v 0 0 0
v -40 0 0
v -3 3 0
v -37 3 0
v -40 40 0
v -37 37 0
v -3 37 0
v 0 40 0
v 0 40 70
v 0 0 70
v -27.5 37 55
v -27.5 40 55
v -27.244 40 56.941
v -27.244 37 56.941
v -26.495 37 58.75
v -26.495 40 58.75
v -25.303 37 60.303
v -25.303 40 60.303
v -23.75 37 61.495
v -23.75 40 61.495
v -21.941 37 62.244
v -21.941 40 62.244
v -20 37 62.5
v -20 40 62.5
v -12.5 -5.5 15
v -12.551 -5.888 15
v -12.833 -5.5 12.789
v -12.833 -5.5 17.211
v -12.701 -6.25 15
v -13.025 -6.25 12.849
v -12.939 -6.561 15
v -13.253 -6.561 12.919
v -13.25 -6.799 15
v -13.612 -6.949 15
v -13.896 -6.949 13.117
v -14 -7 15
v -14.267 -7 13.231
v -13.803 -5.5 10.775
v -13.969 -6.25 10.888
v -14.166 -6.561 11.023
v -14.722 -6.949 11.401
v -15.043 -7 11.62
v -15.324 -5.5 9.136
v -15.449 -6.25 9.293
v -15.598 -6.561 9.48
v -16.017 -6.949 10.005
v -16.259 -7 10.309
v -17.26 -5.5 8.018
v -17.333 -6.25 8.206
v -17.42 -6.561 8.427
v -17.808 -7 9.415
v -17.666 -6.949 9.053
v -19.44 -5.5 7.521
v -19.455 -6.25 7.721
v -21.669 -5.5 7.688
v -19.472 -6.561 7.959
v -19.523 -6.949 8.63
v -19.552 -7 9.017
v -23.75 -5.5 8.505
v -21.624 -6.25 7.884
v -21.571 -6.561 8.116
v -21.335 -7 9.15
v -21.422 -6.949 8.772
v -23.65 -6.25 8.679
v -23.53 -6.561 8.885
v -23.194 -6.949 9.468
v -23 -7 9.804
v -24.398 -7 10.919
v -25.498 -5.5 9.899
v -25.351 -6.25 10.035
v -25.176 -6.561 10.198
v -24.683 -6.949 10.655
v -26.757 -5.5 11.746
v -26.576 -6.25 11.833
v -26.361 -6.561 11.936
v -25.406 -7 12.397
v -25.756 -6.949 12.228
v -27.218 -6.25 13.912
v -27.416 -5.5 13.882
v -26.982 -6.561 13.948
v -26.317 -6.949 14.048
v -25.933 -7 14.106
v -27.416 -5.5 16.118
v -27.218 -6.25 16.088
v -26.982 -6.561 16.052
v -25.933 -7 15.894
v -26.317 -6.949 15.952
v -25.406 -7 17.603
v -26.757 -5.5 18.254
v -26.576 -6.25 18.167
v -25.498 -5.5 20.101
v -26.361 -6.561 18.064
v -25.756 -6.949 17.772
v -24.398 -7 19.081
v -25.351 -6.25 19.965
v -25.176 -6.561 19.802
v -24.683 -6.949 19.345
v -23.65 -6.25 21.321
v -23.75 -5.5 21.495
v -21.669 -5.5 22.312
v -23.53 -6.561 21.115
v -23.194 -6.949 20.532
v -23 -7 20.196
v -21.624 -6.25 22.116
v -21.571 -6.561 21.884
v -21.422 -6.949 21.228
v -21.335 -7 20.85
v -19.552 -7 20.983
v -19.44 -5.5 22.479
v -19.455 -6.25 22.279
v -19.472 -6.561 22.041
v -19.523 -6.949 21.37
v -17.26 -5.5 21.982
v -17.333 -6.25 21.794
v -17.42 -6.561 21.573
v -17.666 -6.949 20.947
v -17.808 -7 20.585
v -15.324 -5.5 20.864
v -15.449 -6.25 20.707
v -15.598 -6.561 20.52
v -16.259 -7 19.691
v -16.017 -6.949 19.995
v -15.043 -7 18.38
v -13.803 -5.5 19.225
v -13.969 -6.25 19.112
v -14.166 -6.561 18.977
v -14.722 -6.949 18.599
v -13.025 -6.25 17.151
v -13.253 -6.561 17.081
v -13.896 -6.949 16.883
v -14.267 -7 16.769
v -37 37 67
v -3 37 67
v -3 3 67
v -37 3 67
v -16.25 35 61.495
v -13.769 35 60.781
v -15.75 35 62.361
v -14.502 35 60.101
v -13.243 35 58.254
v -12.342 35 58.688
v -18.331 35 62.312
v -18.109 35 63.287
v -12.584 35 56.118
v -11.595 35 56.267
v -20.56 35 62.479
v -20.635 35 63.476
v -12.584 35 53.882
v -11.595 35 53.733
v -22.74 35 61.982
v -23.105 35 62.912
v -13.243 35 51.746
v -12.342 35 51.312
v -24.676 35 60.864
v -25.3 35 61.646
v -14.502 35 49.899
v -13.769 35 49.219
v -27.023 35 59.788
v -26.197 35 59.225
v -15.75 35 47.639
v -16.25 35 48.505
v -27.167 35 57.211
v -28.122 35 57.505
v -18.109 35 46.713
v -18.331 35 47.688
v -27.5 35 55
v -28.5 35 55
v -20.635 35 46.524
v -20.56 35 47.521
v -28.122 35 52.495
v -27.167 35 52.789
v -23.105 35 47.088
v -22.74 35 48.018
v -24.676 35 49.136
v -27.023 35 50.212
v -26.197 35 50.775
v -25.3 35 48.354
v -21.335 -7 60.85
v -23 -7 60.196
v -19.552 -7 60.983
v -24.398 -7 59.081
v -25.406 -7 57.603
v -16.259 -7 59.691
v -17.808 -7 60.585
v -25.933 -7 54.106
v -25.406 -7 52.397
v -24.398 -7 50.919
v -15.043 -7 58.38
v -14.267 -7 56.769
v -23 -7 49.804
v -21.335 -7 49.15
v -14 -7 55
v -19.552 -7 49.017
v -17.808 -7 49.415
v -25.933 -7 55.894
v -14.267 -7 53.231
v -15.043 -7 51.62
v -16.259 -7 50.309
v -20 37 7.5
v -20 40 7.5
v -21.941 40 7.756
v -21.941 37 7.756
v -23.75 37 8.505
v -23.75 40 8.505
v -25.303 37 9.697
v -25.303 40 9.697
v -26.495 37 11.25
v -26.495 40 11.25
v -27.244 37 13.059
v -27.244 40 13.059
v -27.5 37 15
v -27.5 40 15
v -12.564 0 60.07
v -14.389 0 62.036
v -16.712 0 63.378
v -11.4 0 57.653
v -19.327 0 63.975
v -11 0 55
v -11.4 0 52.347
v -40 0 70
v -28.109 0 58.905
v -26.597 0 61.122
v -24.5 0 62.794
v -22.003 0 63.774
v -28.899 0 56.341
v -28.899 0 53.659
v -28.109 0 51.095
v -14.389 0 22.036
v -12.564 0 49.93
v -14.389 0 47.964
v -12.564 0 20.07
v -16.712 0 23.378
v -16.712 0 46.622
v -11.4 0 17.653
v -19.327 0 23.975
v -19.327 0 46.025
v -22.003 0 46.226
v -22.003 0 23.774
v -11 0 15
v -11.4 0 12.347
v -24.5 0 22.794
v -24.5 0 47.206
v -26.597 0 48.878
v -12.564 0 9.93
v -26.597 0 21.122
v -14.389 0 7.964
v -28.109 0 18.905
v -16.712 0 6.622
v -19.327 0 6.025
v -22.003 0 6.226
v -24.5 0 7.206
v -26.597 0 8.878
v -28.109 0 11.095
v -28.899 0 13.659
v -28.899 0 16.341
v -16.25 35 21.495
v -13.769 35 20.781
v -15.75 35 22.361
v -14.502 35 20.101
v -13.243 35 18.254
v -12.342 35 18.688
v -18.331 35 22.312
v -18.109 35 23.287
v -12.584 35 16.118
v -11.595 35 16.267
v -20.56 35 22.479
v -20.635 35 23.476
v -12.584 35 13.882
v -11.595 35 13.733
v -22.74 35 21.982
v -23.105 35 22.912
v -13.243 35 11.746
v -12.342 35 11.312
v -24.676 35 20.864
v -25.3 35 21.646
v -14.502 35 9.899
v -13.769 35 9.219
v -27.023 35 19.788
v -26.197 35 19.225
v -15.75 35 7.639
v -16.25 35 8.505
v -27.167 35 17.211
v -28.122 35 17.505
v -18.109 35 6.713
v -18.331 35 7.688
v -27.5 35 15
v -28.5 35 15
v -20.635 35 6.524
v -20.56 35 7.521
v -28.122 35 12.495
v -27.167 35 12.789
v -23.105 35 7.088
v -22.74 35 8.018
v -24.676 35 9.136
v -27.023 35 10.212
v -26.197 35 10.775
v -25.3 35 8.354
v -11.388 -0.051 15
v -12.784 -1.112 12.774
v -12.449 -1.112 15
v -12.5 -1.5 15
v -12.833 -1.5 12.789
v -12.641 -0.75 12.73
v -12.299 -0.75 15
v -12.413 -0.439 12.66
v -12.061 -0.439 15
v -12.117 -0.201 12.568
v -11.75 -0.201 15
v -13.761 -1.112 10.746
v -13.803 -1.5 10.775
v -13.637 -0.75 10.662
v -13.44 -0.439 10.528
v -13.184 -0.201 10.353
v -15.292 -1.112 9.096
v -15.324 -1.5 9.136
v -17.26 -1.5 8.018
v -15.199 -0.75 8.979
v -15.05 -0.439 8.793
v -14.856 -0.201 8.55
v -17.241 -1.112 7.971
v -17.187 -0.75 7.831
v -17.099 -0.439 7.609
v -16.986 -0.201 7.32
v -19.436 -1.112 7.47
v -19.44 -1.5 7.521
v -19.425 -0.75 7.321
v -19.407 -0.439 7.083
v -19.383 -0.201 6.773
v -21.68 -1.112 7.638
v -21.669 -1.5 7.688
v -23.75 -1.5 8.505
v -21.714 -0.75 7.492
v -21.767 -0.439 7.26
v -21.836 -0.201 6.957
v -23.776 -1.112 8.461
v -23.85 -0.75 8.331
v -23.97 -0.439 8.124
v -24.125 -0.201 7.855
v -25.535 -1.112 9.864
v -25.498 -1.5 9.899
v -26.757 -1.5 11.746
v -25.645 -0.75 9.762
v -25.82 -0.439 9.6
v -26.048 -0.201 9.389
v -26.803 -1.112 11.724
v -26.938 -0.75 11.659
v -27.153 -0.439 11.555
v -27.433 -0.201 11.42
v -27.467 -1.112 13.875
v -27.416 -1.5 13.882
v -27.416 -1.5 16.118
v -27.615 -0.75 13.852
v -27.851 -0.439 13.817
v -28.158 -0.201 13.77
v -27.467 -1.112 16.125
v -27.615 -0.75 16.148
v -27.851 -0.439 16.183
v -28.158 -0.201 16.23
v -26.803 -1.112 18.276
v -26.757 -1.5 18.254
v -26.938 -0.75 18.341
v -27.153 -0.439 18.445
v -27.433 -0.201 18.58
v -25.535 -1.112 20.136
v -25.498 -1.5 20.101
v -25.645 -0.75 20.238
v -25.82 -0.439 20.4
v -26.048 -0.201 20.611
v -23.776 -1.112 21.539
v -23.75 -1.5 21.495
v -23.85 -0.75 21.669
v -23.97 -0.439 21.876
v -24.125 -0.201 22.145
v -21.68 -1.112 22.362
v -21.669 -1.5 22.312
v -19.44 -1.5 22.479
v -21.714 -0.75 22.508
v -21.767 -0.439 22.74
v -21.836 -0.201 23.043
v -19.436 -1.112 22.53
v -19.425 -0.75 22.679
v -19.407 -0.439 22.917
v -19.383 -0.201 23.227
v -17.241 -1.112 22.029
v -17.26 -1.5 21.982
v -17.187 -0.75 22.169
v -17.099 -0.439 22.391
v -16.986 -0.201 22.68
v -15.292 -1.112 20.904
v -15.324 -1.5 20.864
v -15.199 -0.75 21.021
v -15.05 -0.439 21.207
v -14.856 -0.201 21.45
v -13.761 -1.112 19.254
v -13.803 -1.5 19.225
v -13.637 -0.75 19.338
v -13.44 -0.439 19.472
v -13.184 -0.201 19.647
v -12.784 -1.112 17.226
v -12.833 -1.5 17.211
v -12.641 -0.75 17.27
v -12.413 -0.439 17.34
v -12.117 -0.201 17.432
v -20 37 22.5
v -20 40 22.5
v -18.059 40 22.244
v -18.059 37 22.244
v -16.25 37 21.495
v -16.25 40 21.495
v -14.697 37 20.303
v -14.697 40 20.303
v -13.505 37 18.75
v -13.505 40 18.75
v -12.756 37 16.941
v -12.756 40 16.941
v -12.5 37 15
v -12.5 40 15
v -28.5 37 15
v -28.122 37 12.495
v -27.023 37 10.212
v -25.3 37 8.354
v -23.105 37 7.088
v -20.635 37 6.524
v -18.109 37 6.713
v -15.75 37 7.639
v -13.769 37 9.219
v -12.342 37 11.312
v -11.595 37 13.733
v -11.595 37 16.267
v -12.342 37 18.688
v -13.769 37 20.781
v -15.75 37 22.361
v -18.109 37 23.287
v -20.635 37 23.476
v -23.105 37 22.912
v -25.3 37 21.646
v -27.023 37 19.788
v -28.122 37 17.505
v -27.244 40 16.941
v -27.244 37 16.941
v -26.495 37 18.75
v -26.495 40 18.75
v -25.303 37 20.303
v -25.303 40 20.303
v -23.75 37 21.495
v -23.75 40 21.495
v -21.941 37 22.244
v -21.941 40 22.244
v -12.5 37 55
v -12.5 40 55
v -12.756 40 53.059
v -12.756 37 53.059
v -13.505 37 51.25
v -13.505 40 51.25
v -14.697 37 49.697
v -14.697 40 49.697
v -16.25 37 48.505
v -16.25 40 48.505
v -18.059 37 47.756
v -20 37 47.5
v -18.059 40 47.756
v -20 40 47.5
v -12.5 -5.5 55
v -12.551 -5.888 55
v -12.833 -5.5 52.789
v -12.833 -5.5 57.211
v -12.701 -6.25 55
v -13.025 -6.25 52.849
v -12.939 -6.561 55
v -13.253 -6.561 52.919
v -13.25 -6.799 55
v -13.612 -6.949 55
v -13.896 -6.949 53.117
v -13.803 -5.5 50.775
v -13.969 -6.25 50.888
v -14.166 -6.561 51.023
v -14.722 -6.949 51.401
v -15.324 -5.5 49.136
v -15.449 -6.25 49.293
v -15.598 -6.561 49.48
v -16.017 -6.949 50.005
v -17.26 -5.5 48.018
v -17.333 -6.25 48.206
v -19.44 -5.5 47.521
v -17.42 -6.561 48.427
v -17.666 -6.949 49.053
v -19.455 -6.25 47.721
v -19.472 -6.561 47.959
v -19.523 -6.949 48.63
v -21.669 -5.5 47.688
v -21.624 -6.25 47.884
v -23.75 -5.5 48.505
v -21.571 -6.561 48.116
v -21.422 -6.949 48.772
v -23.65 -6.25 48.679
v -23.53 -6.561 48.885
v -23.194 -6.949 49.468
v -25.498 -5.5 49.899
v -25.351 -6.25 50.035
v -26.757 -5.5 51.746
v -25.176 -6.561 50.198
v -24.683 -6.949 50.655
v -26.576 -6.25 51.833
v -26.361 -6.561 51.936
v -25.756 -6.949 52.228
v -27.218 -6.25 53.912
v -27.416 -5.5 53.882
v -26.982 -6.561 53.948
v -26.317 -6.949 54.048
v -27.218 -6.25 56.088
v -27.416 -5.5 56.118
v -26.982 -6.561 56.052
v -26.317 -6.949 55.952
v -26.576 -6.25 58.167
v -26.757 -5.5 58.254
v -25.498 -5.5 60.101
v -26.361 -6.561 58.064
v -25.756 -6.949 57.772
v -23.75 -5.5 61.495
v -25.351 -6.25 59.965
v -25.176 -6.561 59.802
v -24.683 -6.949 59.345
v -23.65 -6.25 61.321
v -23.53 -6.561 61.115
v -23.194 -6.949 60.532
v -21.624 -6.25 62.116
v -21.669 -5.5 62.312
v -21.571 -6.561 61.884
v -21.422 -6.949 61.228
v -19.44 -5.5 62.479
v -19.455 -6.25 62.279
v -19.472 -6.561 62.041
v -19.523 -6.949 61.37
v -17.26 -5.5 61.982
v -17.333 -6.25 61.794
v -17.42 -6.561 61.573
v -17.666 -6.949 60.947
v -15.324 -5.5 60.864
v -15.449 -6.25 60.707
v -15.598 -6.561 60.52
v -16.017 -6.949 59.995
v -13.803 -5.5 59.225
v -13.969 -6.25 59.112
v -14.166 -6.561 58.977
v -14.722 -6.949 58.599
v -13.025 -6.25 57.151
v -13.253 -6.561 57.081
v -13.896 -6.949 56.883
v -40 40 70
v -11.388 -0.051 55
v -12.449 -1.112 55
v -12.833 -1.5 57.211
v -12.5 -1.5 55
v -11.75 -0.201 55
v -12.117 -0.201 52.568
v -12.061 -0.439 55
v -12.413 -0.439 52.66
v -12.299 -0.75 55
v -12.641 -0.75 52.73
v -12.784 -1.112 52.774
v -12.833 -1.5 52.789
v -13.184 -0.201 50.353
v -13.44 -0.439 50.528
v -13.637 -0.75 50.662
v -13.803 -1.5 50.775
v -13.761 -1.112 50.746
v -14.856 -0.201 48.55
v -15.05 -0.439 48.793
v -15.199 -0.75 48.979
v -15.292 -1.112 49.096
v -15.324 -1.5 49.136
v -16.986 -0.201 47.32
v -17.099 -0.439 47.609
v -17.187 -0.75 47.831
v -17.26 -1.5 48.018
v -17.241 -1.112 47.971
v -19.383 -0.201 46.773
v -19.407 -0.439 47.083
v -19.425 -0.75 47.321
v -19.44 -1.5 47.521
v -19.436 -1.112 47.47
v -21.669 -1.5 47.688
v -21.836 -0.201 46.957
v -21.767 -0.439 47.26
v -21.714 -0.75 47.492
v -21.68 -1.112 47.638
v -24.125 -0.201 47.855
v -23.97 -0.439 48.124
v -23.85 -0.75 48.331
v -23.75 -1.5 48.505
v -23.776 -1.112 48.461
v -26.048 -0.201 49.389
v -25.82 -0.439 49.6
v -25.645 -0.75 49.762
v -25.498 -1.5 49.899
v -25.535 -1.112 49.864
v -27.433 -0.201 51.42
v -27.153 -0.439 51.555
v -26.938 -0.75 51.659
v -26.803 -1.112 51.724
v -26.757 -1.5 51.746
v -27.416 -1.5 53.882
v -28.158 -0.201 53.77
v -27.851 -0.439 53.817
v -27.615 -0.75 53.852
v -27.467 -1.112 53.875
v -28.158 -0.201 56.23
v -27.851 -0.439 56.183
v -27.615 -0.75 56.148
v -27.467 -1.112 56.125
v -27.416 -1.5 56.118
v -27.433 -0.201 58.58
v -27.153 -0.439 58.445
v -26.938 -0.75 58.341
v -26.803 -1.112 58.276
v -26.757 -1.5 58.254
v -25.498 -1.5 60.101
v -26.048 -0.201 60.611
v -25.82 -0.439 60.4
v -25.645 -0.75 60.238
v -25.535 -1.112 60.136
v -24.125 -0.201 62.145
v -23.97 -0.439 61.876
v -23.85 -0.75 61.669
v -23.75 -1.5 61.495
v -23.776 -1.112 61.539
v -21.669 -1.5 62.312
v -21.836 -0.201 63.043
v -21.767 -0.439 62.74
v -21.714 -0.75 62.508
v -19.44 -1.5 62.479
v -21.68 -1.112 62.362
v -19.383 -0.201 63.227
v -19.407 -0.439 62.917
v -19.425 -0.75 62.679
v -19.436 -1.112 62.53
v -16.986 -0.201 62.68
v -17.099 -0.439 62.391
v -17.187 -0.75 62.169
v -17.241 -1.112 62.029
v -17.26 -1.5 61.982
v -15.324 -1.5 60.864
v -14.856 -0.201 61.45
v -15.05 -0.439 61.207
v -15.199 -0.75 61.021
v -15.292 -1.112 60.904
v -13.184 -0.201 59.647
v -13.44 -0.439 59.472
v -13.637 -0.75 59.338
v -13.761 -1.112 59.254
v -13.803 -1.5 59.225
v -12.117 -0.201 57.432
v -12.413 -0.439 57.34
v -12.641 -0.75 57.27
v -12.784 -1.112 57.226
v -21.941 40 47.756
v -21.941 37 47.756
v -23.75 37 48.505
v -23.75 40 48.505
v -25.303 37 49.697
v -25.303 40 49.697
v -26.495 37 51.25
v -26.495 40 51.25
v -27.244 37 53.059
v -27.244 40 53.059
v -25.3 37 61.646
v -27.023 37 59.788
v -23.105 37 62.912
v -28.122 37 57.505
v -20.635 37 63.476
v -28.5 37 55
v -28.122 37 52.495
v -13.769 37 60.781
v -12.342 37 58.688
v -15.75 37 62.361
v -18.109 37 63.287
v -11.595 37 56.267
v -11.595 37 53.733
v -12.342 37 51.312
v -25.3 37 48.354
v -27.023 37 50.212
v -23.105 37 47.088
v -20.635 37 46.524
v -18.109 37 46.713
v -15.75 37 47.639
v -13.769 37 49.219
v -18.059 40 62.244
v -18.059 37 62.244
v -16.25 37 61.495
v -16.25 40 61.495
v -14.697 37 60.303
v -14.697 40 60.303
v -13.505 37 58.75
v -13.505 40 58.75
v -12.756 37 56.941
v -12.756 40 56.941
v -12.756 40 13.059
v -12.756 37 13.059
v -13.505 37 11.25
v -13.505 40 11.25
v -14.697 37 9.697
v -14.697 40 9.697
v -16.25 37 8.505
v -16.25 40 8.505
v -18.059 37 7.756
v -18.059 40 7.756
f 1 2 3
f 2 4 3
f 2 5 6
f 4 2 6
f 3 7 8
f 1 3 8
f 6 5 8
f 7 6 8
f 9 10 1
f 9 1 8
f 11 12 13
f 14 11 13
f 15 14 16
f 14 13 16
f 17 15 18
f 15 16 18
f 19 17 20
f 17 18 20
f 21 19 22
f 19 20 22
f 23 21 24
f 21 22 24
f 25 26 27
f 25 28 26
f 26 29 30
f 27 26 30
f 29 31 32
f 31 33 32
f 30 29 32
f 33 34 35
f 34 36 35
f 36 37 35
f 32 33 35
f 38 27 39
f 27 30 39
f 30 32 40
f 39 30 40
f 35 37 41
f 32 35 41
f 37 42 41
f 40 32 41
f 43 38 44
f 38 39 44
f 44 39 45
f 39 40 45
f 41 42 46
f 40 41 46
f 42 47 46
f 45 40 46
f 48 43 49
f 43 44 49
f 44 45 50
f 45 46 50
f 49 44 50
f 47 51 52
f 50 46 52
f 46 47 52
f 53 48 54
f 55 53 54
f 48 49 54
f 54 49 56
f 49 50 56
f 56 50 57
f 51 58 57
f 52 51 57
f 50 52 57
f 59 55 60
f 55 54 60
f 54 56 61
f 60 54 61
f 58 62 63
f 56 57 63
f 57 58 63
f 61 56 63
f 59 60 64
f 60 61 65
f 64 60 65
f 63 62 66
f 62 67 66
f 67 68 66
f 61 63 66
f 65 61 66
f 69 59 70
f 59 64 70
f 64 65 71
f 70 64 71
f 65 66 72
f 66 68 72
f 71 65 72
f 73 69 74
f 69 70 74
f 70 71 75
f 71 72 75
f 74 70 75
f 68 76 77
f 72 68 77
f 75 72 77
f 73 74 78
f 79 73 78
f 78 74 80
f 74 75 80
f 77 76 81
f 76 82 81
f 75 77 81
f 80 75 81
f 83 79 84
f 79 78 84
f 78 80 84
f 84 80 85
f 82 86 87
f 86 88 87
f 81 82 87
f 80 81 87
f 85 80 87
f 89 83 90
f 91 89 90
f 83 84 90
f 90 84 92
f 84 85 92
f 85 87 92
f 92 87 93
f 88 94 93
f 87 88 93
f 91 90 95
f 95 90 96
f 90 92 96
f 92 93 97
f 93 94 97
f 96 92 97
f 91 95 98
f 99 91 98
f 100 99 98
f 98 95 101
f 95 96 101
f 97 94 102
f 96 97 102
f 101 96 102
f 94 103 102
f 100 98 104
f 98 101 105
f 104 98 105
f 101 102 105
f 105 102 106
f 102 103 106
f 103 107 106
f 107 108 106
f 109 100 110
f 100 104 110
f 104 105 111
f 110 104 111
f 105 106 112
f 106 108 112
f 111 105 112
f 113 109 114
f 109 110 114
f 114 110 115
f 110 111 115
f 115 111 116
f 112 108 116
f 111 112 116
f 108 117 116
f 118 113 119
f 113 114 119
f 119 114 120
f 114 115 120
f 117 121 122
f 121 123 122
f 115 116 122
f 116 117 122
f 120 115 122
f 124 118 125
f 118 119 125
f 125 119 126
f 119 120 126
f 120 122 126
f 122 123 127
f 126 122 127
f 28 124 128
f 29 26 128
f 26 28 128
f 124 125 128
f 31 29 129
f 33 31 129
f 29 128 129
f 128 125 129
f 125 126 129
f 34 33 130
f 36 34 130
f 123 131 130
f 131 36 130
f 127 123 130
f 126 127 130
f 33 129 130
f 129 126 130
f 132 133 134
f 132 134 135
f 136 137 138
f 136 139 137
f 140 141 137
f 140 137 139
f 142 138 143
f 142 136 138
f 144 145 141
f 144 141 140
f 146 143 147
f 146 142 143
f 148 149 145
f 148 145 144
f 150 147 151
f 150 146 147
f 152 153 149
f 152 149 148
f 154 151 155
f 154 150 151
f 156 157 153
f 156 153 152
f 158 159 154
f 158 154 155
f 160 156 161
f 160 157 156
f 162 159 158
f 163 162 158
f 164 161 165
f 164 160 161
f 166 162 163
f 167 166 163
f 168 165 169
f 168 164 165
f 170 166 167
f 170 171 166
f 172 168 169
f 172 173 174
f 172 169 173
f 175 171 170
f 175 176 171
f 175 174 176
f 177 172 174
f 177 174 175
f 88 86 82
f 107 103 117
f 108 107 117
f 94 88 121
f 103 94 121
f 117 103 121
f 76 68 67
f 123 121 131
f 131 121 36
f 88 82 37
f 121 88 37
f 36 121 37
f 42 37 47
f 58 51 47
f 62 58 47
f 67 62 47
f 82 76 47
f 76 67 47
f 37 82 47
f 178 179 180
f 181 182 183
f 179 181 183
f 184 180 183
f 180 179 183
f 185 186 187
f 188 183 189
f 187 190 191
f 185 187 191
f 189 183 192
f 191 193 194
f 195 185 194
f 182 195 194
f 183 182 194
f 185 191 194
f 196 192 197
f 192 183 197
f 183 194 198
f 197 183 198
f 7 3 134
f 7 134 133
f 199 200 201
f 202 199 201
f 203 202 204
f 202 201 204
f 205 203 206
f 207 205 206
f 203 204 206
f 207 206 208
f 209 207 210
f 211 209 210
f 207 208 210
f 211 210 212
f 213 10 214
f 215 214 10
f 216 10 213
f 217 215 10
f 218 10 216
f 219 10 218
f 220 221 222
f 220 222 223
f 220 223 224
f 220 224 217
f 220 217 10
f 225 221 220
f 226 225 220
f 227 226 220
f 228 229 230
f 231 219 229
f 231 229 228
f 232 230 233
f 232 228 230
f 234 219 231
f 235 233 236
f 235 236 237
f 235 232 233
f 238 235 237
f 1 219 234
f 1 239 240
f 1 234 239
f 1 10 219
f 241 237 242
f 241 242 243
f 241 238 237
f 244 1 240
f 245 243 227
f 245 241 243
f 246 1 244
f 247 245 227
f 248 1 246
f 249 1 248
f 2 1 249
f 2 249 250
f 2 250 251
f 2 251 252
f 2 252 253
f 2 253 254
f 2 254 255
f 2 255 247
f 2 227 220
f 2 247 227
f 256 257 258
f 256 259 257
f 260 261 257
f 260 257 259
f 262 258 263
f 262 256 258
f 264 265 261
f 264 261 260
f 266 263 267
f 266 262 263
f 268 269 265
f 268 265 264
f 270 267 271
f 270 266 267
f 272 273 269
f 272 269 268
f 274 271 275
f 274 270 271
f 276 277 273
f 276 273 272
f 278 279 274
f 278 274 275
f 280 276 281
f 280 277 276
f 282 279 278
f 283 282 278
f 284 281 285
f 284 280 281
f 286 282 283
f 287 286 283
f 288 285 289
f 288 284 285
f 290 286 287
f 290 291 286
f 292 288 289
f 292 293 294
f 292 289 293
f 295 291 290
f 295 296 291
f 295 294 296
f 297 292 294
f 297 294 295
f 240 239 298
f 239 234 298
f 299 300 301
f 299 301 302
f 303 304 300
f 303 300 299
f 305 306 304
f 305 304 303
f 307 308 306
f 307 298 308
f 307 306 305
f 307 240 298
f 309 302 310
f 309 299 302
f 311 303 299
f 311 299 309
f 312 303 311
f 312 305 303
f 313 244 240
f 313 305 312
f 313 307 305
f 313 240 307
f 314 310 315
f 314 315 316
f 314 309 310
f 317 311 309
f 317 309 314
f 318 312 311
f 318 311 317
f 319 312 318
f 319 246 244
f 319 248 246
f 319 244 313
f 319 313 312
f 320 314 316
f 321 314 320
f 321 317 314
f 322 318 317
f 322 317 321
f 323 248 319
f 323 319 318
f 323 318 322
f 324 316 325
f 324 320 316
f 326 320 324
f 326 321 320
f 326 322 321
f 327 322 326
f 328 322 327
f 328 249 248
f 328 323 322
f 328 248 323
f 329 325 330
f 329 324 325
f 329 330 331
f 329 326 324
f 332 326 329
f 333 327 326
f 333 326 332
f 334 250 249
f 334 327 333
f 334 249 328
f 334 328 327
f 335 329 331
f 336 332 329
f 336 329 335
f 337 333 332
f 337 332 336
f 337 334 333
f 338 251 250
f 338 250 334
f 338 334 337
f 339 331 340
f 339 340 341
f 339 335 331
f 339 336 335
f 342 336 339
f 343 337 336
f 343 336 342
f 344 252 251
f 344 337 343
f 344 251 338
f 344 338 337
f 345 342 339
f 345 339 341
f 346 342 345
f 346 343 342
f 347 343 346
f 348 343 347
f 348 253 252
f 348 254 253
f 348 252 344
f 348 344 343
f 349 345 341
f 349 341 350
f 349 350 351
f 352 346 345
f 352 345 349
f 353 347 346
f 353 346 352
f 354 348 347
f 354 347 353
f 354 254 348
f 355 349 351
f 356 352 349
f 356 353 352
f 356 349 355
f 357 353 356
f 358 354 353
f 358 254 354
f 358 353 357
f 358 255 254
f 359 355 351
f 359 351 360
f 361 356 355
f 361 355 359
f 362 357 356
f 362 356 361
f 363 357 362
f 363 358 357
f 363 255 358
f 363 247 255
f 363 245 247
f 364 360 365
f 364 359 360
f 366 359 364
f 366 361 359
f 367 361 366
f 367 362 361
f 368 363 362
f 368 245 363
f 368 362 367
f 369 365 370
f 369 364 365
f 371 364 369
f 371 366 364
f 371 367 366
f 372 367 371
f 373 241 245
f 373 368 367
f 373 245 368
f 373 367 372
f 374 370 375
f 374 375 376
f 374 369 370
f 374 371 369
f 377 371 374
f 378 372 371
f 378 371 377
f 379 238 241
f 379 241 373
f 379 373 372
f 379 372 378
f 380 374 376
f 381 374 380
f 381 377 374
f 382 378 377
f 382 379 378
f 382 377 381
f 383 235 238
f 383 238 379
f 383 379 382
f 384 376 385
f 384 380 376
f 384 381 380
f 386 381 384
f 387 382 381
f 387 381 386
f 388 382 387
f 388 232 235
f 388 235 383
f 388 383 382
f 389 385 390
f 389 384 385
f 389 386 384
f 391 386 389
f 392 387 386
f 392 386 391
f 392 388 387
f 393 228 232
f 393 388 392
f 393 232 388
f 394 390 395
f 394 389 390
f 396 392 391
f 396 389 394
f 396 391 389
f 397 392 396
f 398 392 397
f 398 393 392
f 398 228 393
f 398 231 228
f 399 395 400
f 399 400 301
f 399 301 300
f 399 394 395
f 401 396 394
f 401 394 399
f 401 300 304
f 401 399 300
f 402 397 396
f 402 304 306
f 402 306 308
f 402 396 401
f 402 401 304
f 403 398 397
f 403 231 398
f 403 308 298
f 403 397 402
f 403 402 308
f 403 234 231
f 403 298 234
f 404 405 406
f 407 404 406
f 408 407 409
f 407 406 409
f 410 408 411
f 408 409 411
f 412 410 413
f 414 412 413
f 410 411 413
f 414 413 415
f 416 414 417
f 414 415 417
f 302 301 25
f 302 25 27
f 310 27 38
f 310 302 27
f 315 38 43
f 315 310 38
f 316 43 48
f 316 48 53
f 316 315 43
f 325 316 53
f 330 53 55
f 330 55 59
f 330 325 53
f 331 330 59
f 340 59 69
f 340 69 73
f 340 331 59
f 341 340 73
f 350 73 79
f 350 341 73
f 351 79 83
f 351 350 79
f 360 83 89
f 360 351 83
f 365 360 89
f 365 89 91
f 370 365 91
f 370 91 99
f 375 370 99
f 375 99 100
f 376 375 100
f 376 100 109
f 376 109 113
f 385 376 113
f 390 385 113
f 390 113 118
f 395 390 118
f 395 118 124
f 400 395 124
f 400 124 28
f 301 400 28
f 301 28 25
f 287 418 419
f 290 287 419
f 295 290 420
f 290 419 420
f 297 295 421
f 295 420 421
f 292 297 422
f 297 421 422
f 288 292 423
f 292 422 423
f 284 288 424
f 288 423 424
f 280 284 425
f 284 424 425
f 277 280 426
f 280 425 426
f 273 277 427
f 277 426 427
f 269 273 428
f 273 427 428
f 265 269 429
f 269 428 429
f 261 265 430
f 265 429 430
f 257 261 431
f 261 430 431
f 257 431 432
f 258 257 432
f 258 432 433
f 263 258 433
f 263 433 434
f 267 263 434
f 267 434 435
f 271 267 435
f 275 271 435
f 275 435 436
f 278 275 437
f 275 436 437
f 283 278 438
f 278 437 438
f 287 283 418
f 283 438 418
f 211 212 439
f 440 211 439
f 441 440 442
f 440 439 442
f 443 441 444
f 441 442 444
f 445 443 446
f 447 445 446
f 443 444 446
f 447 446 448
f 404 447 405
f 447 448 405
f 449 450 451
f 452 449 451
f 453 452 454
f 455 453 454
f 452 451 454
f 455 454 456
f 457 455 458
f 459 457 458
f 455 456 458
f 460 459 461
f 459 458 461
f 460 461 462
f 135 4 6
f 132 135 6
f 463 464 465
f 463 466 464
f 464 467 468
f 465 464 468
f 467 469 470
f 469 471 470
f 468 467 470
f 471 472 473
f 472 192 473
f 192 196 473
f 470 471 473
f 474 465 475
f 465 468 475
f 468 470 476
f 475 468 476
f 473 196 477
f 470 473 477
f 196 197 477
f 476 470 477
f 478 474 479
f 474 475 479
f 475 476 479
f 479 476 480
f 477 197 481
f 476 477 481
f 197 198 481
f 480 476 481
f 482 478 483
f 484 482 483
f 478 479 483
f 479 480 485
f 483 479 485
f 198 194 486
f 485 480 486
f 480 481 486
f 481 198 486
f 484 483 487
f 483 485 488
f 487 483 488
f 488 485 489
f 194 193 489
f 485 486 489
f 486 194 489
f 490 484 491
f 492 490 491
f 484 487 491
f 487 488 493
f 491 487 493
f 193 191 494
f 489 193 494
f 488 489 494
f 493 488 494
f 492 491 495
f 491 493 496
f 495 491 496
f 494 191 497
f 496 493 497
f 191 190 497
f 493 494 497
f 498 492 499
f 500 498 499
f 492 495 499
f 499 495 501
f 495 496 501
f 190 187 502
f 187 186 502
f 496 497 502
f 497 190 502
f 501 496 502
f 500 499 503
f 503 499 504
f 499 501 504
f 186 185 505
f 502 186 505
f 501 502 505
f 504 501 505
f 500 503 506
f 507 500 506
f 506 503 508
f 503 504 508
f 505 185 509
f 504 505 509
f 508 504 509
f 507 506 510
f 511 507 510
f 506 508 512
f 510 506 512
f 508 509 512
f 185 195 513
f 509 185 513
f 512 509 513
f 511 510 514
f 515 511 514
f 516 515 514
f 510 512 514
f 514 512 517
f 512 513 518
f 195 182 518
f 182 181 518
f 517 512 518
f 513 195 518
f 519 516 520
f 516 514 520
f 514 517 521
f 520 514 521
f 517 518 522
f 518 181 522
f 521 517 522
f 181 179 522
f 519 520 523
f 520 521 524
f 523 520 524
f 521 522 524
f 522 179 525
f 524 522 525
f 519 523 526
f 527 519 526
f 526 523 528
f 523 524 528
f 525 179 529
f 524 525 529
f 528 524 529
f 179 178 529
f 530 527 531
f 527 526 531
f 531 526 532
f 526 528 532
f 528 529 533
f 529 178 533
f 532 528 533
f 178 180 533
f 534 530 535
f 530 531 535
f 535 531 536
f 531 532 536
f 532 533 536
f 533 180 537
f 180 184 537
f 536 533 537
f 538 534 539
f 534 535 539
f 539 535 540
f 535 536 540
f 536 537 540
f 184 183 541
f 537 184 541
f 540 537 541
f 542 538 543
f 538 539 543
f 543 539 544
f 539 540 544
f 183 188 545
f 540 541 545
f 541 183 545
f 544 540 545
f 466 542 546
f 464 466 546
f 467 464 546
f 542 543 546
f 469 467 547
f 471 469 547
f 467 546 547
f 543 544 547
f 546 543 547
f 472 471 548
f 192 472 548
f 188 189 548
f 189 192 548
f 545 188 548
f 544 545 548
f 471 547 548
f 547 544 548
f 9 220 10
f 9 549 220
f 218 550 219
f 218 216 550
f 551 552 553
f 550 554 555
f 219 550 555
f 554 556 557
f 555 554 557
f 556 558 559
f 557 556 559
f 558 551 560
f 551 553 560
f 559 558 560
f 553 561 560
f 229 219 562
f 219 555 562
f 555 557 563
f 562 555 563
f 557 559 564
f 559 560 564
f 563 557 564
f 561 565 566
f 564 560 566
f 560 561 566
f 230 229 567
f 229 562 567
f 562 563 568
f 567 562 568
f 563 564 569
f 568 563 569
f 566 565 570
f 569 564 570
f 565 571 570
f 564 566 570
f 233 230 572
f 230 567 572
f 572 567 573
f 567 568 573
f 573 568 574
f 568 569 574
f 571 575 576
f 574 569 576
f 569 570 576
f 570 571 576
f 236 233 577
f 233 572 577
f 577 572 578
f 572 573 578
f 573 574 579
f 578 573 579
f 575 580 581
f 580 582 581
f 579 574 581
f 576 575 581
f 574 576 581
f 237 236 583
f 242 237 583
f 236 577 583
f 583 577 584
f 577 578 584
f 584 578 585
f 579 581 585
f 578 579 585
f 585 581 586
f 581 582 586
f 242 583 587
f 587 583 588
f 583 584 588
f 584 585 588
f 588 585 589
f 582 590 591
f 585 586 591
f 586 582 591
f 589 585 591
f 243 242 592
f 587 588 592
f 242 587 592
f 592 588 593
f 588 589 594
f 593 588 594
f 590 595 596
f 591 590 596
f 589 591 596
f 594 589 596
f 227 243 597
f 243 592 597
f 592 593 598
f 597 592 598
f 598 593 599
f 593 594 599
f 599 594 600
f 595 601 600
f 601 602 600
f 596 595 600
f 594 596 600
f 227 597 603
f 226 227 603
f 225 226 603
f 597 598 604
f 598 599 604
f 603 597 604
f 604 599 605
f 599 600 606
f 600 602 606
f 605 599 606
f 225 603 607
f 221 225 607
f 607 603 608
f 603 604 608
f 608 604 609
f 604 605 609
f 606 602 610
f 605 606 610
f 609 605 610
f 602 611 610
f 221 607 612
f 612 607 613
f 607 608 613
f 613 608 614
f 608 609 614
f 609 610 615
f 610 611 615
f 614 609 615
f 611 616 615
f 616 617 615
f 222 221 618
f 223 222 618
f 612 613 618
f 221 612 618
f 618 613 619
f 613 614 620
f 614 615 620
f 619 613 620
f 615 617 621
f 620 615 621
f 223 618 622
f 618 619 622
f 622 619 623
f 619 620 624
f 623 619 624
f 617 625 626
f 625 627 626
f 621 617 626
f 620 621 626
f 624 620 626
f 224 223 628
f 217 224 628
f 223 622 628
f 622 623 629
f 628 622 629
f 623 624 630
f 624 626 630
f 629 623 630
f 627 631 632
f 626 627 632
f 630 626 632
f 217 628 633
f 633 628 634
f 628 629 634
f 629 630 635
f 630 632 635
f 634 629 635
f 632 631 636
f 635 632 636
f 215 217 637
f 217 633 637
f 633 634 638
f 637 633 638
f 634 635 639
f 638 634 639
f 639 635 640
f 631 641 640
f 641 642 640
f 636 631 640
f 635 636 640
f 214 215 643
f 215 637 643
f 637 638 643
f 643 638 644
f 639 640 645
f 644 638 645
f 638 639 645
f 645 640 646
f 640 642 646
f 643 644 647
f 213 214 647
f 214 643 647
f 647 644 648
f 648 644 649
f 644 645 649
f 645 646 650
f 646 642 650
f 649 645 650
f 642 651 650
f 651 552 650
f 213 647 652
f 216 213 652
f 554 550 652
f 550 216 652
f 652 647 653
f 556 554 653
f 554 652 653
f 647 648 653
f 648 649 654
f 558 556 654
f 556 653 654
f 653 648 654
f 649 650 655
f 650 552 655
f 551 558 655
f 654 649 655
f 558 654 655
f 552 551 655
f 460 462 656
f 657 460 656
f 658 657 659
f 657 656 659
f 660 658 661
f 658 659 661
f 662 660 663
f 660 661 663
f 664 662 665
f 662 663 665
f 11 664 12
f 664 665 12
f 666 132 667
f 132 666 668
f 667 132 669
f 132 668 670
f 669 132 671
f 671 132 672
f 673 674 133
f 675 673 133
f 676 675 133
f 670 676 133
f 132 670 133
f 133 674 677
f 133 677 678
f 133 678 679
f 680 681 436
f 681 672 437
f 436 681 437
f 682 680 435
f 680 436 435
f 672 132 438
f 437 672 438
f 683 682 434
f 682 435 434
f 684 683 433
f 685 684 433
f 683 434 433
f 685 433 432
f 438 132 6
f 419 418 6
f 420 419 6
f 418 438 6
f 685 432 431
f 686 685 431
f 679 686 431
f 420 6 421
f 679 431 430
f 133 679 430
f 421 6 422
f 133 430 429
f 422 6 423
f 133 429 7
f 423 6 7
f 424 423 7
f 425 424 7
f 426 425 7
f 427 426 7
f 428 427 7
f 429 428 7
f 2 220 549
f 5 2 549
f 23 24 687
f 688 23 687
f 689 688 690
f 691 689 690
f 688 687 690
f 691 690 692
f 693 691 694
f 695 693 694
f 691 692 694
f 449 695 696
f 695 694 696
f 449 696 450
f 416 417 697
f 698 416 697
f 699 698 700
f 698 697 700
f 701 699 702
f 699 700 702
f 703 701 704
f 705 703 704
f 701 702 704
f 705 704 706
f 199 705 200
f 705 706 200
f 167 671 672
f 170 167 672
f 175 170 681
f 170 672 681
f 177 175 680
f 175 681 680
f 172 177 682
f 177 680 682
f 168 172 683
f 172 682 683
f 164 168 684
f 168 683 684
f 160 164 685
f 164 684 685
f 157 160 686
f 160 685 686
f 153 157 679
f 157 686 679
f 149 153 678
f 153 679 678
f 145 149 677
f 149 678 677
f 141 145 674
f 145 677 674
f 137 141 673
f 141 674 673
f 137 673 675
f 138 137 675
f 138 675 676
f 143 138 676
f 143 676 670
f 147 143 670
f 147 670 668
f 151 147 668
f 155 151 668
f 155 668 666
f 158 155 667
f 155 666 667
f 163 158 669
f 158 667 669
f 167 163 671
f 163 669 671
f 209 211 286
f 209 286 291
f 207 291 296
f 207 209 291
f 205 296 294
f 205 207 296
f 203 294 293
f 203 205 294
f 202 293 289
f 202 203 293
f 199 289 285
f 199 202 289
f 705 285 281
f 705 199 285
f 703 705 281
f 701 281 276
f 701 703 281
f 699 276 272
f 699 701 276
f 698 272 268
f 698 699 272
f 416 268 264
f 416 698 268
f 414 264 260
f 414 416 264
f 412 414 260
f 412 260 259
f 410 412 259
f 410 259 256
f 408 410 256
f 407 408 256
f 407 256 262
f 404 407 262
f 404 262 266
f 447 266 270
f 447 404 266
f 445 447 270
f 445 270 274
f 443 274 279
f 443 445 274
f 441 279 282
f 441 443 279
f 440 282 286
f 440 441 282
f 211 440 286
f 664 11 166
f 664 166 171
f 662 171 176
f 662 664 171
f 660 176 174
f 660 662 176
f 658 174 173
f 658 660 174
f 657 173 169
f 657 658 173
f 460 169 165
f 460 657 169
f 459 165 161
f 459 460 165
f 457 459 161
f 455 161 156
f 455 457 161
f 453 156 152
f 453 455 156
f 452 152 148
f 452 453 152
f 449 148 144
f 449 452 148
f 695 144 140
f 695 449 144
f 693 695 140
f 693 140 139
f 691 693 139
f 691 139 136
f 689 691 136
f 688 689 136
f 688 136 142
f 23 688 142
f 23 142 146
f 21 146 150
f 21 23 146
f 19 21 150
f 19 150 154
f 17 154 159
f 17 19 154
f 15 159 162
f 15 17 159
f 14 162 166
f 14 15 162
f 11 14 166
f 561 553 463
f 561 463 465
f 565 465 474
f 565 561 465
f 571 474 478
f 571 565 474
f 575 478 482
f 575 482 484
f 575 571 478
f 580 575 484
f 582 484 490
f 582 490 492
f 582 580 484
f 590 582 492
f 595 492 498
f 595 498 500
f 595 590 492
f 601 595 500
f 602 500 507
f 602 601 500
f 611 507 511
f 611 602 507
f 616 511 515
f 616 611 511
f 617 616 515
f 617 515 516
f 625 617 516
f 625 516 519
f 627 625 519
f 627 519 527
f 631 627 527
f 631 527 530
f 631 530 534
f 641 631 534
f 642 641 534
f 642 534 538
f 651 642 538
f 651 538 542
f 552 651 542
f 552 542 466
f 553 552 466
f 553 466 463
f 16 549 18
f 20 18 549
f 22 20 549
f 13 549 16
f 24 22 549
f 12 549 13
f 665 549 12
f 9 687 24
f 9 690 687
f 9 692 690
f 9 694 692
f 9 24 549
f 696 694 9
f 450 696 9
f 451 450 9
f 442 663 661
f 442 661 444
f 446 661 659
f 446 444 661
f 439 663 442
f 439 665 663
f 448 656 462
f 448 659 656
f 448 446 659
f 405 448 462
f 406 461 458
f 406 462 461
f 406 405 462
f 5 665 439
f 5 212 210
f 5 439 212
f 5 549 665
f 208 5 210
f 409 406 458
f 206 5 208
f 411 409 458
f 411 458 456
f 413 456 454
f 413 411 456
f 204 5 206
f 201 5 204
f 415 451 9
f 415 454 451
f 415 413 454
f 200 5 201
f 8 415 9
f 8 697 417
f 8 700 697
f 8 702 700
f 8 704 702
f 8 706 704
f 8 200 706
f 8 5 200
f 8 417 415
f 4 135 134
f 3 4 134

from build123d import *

# Parameters (mm, degrees)
SKETCH1_W           = 40
SKETCH1_H           = 40
SKETCH1_W_2         = 34
SKETCH1_H_2         = 34
BOSS_EXTRUDE1_DEPTH = 70
SKETCH2_W           = 34
SKETCH2_H           = 3
BOSS_EXTRUDE2_DEPTH = 37
CUT_EXTRUDE1_DEPTH  = 37
SKETCH4_R           = 8.5
SKETCH4_R_2         = 7.5
BOSS_EXTRUDE3_DEPTH = 2
SKETCH6_R           = 7.5
BOSS_EXTRUDE4_DEPTH = 10
FILLET2_R           = 1.5
FILLET3_R           = 1.5
FILLET4_R           = 1.5
FILLET5_R           = 1.5


with BuildPart() as part:
    # Sketch1 → Boss-Extrude1 (new body)
    with BuildSketch(Plane.XY):
        with Locations((-20, 20)):
            Rectangle(SKETCH1_W, SKETCH1_H)
        with Locations((-20, 20)):
            Rectangle(SKETCH1_W_2, SKETCH1_H_2, mode=Mode.SUBTRACT)
    extrude(amount=BOSS_EXTRUDE1_DEPTH)

    # Sketch2 → Boss-Extrude2 (add)
    with BuildSketch(Plane(origin=(0, 37, 0), x_dir=(-1, 0, 0), z_dir=(0, -1, 0))):
        with Locations((20, -68.5)):
            Rectangle(SKETCH2_W, SKETCH2_H)
    extrude(amount=BOSS_EXTRUDE2_DEPTH)

    # Sketch3 → Cut-Extrude1 (cut)
    with BuildSketch(Plane(origin=(0, 40, 0), x_dir=(1, 0, 0), z_dir=(0, 1, 0))):
        with BuildLine():
            ThreePointArc((-12.5, -15), (-14.696699141, -9.696699141), (-20, -7.5))
            Line((-20, -7.5), (-20, -15))
            Line((-20, -15), (-12.5, -15))
        make_face()
        with BuildLine():
            Line((-20, -15), (-20, -7.5))
            ThreePointArc((-20, -7.5), (-25.303300859, -9.696699141), (-27.5, -15))
            Line((-27.5, -15), (-20, -15))
        make_face()
        with BuildLine():
            Line((-12.5, -15), (-20, -15))
            Line((-20, -15), (-20, -22.5))
            ThreePointArc((-20, -22.5), (-14.696699141, -20.303300859), (-12.5, -15))
        make_face()
        with BuildLine():
            Line((-20, -22.5), (-20, -15))
            Line((-20, -15), (-27.5, -15))
            ThreePointArc((-27.5, -15), (-25.303300859, -20.303300859), (-20, -22.5))
        make_face()
        with BuildLine():
            ThreePointArc((-12.5, -55), (-14.696699141, -49.696699141), (-20, -47.5))
            Line((-20, -47.5), (-20, -55))
            Line((-20, -55), (-12.5, -55))
        make_face()
        with BuildLine():
            Line((-20, -55), (-20, -47.5))
            ThreePointArc((-20, -47.5), (-25.303300859, -49.696699141), (-27.5, -55))
            Line((-27.5, -55), (-20, -55))
        make_face()
        with BuildLine():
            Line((-12.5, -55), (-20, -55))
            Line((-20, -55), (-20, -62.5))
            ThreePointArc((-20, -62.5), (-14.696699141, -60.303300859), (-12.5, -55))
        make_face()
        with BuildLine():
            Line((-20, -62.5), (-20, -55))
            Line((-20, -55), (-27.5, -55))
            ThreePointArc((-27.5, -55), (-25.303300859, -60.303300859), (-20, -62.5))
        make_face()
    extrude(amount=-CUT_EXTRUDE1_DEPTH, mode=Mode.SUBTRACT)

    # Sketch4 → Boss-Extrude3 (add)
    with BuildSketch(Plane(origin=(0, 37, 0), x_dir=(-1, 0, 0), z_dir=(0, -1, 0))):
        with Locations((20, -15)):
            Circle(SKETCH4_R)
        with Locations((20, -15)):
            Circle(SKETCH4_R_2, mode=Mode.SUBTRACT)
        with Locations((20, -55)):
            Circle(SKETCH4_R)
        with Locations((20, -55)):
            Circle(SKETCH4_R_2, mode=Mode.SUBTRACT)
    extrude(amount=BOSS_EXTRUDE3_DEPTH)

    # Sketch6 → Boss-Extrude4 (add)
    with BuildSketch(Plane(origin=(0, 3, 0), x_dir=(1, 0, 0), z_dir=(0, 1, 0))):
        with Locations((-20, -15)):
            Circle(SKETCH6_R)
        with Locations((-20, -55)):
            Circle(SKETCH6_R)
    extrude(amount=-BOSS_EXTRUDE4_DEPTH)

    # Fillet2
    fillet2_edges = [part.edges().sort_by_distance(p)[0] for p in [
        (-27.5, -7, 55),
    ]]
    fillet(fillet2_edges, radius=FILLET2_R)

    # Fillet3
    fillet3_edges = [part.edges().sort_by_distance(p)[0] for p in [
        (-27.5, -7, 15),
    ]]
    fillet(fillet3_edges, radius=FILLET3_R)

    # Fillet4
    fillet4_edges = [part.edges().sort_by_distance(p)[0] for p in [
        (-27.5, 0, 15),
    ]]
    fillet(fillet4_edges, radius=FILLET4_R)

    # Fillet5
    fillet5_edges = [part.edges().sort_by_distance(p)[0] for p in [
        (-27.5, 0, 55),
    ]]
    fillet(fillet5_edges, radius=FILLET5_R)


solid = part.part
